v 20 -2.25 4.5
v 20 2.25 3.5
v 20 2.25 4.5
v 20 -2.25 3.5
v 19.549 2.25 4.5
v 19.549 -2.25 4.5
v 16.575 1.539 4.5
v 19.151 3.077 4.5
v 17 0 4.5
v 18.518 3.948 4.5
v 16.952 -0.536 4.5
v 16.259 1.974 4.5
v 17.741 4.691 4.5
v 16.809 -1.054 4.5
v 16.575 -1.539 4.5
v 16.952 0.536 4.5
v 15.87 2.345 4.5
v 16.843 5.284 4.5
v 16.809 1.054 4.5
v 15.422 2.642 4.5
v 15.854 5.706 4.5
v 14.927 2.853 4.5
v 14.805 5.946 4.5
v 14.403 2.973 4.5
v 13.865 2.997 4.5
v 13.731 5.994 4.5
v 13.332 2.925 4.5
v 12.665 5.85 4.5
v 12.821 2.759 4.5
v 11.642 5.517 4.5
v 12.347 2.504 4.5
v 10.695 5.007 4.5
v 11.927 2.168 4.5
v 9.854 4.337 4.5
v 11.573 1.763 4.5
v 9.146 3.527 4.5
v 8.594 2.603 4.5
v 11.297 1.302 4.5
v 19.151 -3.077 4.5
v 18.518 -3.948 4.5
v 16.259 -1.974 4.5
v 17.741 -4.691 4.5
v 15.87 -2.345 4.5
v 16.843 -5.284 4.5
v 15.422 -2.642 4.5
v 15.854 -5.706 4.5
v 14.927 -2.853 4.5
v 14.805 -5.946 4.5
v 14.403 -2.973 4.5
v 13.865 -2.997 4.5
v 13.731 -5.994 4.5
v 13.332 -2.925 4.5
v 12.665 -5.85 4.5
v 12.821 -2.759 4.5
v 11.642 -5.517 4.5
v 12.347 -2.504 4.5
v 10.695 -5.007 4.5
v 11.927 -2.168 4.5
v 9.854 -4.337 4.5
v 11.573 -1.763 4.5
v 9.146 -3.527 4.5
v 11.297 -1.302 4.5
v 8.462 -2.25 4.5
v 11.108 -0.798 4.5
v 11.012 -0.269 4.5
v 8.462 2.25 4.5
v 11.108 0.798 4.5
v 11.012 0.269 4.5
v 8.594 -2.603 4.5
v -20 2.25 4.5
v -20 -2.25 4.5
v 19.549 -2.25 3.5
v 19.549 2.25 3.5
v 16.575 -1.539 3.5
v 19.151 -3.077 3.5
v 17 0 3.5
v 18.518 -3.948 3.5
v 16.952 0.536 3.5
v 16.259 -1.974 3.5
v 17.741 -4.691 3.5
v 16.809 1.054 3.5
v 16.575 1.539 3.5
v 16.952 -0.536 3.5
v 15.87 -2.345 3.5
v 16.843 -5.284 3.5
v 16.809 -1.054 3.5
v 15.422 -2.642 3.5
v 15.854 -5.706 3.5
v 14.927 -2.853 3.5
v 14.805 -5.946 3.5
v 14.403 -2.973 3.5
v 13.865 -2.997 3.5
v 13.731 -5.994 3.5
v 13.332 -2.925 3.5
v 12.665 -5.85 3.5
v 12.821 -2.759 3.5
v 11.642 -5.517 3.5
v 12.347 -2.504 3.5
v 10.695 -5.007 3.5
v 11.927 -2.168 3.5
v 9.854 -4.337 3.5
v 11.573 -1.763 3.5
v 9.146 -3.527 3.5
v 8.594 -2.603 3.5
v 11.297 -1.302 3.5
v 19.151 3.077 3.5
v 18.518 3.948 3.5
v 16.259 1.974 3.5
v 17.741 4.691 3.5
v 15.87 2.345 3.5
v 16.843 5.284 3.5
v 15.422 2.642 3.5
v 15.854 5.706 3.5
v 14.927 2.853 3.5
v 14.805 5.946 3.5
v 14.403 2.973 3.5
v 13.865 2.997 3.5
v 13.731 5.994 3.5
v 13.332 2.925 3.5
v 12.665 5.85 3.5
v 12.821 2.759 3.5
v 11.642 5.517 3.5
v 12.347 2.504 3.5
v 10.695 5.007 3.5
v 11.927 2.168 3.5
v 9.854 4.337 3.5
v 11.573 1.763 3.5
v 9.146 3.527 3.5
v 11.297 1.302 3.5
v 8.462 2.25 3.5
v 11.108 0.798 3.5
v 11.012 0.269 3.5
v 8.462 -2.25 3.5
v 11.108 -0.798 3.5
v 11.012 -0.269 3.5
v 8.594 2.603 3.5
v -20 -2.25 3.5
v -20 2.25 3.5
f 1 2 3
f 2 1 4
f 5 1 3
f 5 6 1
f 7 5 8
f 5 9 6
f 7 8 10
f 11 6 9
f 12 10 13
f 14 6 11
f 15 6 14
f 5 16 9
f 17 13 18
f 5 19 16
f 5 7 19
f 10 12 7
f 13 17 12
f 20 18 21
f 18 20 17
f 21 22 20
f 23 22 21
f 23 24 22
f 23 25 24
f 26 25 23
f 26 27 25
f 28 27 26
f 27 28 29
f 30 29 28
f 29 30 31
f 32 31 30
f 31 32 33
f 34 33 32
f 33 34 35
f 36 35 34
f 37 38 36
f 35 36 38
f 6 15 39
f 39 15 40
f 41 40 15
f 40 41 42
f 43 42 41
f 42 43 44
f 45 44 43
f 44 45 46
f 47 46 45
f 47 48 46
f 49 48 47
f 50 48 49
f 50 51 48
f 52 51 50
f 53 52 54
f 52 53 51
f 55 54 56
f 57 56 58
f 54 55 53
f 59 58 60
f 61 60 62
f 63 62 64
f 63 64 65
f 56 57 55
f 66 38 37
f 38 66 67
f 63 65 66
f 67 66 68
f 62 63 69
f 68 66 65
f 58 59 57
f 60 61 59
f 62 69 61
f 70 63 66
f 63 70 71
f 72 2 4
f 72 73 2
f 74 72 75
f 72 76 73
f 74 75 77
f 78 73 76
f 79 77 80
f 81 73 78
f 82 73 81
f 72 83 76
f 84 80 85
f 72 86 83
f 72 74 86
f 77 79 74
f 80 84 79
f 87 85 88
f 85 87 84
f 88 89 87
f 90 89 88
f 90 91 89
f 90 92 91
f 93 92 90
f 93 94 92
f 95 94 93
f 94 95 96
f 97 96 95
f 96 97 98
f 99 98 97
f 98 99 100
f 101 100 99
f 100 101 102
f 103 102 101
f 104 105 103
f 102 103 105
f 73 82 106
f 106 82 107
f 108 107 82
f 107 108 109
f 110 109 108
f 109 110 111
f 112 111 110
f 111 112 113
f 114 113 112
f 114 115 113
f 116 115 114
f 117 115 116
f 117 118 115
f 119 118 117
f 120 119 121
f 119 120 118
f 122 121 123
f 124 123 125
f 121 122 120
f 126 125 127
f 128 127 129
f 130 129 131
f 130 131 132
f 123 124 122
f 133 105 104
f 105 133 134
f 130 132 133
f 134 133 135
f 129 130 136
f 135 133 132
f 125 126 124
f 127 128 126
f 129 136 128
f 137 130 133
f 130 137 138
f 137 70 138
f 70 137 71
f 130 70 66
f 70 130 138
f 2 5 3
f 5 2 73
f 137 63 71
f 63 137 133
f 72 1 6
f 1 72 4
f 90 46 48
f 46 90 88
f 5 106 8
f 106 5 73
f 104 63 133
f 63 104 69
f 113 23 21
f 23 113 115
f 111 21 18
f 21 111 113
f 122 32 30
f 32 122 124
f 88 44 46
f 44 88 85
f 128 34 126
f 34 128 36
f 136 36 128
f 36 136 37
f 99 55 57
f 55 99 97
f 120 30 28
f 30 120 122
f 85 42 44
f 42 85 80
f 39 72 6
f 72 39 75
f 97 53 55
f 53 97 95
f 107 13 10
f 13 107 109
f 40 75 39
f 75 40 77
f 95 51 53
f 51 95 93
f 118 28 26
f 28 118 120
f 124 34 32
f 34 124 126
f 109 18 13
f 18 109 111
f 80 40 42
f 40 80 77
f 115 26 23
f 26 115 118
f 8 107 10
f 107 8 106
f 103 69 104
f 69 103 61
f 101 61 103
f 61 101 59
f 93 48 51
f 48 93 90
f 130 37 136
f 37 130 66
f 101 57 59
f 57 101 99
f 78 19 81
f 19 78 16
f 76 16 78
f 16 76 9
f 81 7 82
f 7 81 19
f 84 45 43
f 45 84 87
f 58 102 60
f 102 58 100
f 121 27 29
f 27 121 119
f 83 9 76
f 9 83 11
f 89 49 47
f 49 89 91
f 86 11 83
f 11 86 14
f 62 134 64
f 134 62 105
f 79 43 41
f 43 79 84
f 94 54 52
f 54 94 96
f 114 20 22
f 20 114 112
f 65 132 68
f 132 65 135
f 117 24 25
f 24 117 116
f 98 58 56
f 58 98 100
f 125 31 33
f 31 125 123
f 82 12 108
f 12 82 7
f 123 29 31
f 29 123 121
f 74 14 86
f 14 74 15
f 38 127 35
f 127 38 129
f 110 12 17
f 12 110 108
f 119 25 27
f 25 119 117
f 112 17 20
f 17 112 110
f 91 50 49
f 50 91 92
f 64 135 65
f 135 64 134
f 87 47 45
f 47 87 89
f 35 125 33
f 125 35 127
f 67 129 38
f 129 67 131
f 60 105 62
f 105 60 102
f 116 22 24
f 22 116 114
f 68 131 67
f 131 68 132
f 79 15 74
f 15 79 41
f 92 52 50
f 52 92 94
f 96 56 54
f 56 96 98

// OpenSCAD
// Simple parametric clock inspired by user image
$fn=100;

// -------------------------
// RENDER MODE SELECTION
// -------------------------
// Change this value to render different parts:
// 0 = Full assembly preview (all parts together)
// 1 = Housing only (for 3D printing)
// 2 = Topography disc only (for 3D printing)
// 3 = Hour markers only (for 3D printing)
// 4 = Hands only (for 3D printing)
// 5 = Base only (for 3D printing)
// 6 = Exploded view (all parts separated)
render_mode = 4;

// Function to create milky way pattern - stars and flowing clouds
module milky_way_pattern(r, depth) {
    // Random seed for consistent pattern
    function random(seed) = fract(sin(seed * 12.9898 + 78.233) * 43758.5453);
    function fract(x) = x - floor(x);
    
    // Stars - small dots scattered across the disc
    for(i=[0:300]) {
        rand_r = random(i * 7.123) * r * 0.85;
        rand_angle = random(i * 3.456) * 360;
        star_size = 0.5 + random(i * 9.876) * 1.2;
        star_height = depth + 1 + random(i * 11.234) * depth * 2;  // Random height variation
        
        x = rand_r * cos(rand_angle);
        y = rand_r * sin(rand_angle);
        
        translate([x, y, -0.5])
            cylinder(r=star_size, h=star_height, $fn=8);
    }
    
    // Milky way band - flowing organic cloud structures across the disc
    for(i=[0:120]) {
        t = i / 120;
        
        // Create flowing path across disc
        path_x = (t - 0.5) * r * 1.8 + 15 * sin(t * 360 * 2);
        path_y = 10 * sin(t * 360 * 3) + 8 * cos(t * 360 * 5);
        
        // Variable density - more clouds in center of band
        density = sin(t * 180) * sin(t * 180);
        
        if(random(i * 234.567) < density) {
            cloud_size = 2 + random(i * 8.901) * 5;
            cloud_height = depth + 1 + random(i * 13.579) * depth * 3;  // Random height variation
            scatter_x = (random(i * 4.567) - 0.5) * 45;
            scatter_y = (random(i * 7.890) - 0.5) * 50;
            
            translate([path_x + scatter_x, path_y + scatter_y, -0.5])
                cylinder(r=cloud_size, h=cloud_height, $fn=8);
        }
    }
    
    // Additional wispy tendrils
    for(k=[0:50]) {
        tendril_angle = random(k * 15.678) * 360;
        tendril_dist = 10 + random(k * 23.456) * 70;
        tendril_size = 1.5 + random(k * 34.567) * 2.5;
        tendril_height = depth + 1 + random(k * 67.890) * depth * 1.5;  // Random height variation
        
        tendril_x = tendril_dist * cos(tendril_angle) + (random(k * 45.678) - 0.5) * 30;
        tendril_y = tendril_dist * sin(tendril_angle) + (random(k * 56.789) - 0.5) * 30;
        
        translate([tendril_x, tendril_y, -0.5])
            cylinder(r=tendril_size, h=tendril_height, $fn=6);
    }
}

module topography_disc(r=120, thickness=4, center_hole_d=6){
    difference() {
        union() {
            // Base disc
            cylinder(r=r, h=thickness);
            
            // Milky way pattern as protrusions on the surface
            translate([0, 0, thickness])
                milky_way_pattern(r, 0.4);
        }
        
        // Center hole for clock mechanism
        translate([0, 0, -1])
            cylinder(d=center_hole_d, h=thickness + 10);
        
        // Holes for housing protrusions at 12, 3, 6, 9 o'clock
        for(angle=[0, 90, 180, 270]) {
            rotate([0, 0, angle])
                translate([r - 15, 0, -1])
                    linear_extrude(height=thickness + 2)
                        offset(r=4.5)
                            offset(delta=-4.5)
                                translate([-8.3, -5.3])
                                    square([16.6, 10.6]);
        }
        
        // Keep within disc bounds
        translate([0, 0, -1])
            difference() {
                cylinder(r=r + 10, h=thickness + 10);
                cylinder(r=r, h=thickness + 10);
            }
    }
}


module minute_hand(){
    // Minute hand - longer with 3mm hole at base and circular boss
    difference() {
        union() {
            // Thinner main hand
            color("gray") translate([0,0,5])
                cube([60,4,1], center=true);
            // Circular boss around the hole
            translate([24,0,4.5])
                cylinder(d=10, h=1, $fn=30);
        }
        // 3mm hole through the boss
        translate([24,0,4])
            cylinder(d=3, h=2, $fn=30);
    }
}
    
module hour_hand(){
    // Hour hand - shorter with 6mm hole at base and circular boss
    difference() {
        union() {
            // Thinner main hand
            color("gray") translate([0,0,4])
                cube([40,4.5,1], center=true);
            // Circular boss around the hole
            translate([14,0,3.5])
                cylinder(d=12, h=1, $fn=35);
        }
        // 6mm hole through the boss
        translate([14,0,3])
            cylinder(d=6, h=2, $fn=35);
    }
}


module housing(r=125, depth=20, clockwork_slot_size=55, rim_width=5, disc_recess_depth=5, slot_corner_radius=2, sleeve_wall=3, slot_clearance=0.5){
    difference(){
        union() {
            // Main body
            cylinder(r=r, h=depth);
            
            // Enclosed sleeve for clock mechanism (protruding inward)
            translate([0, 0, -1])
                linear_extrude(height=depth - disc_recess_depth - 2)
                    offset(r=slot_corner_radius + sleeve_wall)
                        offset(delta=-(slot_corner_radius + sleeve_wall))
                            translate([-(clockwork_slot_size + 2*slot_clearance)/2 - sleeve_wall, -(clockwork_slot_size + 2*slot_clearance)/2 - sleeve_wall])
                                square([clockwork_slot_size + 2*slot_clearance + 2*sleeve_wall, clockwork_slot_size + 2*slot_clearance + 2*sleeve_wall]);
            
            // 4 rectangular protrusions with rounded edges at 12, 3, 6, 9 o'clock in disc recess
            for(angle=[0, 90, 180, 270]) {
                rotate([0, 0, angle])
                    translate([r - 20, 0, depth - disc_recess_depth])
                        linear_extrude(height=disc_recess_depth)
                            offset(r=4)
                                offset(delta=-4)
                                    translate([-8, -5])
                                        square([16, 10]);
            }
        }
        
        // Front recess for disc (shallow circular pocket) - subtract protrusions to keep them
        difference() {
            translate([0, 0, depth - disc_recess_depth])
                cylinder(r=r - rim_width, h=disc_recess_depth + 1);
            
            // Subtract the protrusions from the recess so they remain
            for(angle=[0, 90, 180, 270]) {
                rotate([0, 0, angle])
                    translate([r - 20, 0, depth - disc_recess_depth])
                        linear_extrude(height=disc_recess_depth + 1)
                            offset(r=3)
                                offset(delta=-4)
                                    translate([-8, -5])
                                        square([16, 10]);
            }
        }
        
        // Hollow out the back (but leave sleeve solid)
        translate([0, 0, -1])
            difference() {
                cylinder(r=r - rim_width, h=depth - disc_recess_depth);
                // Keep the sleeve area solid
                linear_extrude(height=depth - disc_recess_depth + 2)
                    offset(r=slot_corner_radius + sleeve_wall + 2)
                        offset(delta=-(slot_corner_radius + sleeve_wall + 2))
                            translate([-(clockwork_slot_size + 2*slot_clearance)/2 - sleeve_wall - 2, -(clockwork_slot_size + 2*slot_clearance)/2 - sleeve_wall - 2])
                                square([clockwork_slot_size + 2*slot_clearance + 2*sleeve_wall + 4, clockwork_slot_size + 2*slot_clearance + 2*sleeve_wall + 4]);
            }
        
        // Center hole for clock shaft
        translate([0, 0, -1])
            cylinder(d=10, h=depth + 2);
        
        // Square slot for clock mechanism with rounded edges and clearance
        translate([0, 0, -1])
            linear_extrude(height=depth - disc_recess_depth - 2)
                offset(r=slot_corner_radius)
                    offset(delta=-slot_corner_radius)
                        translate([-(clockwork_slot_size + 2*slot_clearance)/2, -(clockwork_slot_size + 2*slot_clearance)/2])
                            square([clockwork_slot_size + 2*slot_clearance, clockwork_slot_size + 2*slot_clearance]);
    }
}


module base(w=160,d=40,h=10){
    cube([w,d,h], center=true);
}

module clock(){
    housing();
    translate([0,0,0])
        topography_disc();
    hour_markers();
    hands();
    translate([0, -50, -5])
        base();
}

// -------------------------
// Render Selection
// -------------------------
if (render_mode == 0) {
    // Mode 0: Full assembly preview
    clock();
    
} else if (render_mode == 1) {
    // Mode 1: Housing only
    housing();
    
} else if (render_mode == 2) {
    // Mode 2: Topography disc only
    topography_disc();
    
} else if (render_mode == 3) {
    // Mode 3: Hour markers only (all 4 combined)
    hour_markers();
    
} else if (render_mode == 4) {
    // Mode 4: Hands only (both minute and hour)
    hour_hand();
}
else if (render_mode == 5) {
    // Mode 5: Hands only (both minute and hour)
    minute_hand();
    
} else if (render_mode == 6) {
    // Mode 5: Base only
    base();
    
    
}

else if (render_mode == 7) {
    // Mode 6: Exploded view
    translate([0, 0, 40])
        housing();
    translate([0, 0, 30])
        topography_disc();
    translate([0, 0, 20])
        hour_markers();
    translate([0, 0, 10])
        hands();
    translate([0, -50, 0])
        base();
}
